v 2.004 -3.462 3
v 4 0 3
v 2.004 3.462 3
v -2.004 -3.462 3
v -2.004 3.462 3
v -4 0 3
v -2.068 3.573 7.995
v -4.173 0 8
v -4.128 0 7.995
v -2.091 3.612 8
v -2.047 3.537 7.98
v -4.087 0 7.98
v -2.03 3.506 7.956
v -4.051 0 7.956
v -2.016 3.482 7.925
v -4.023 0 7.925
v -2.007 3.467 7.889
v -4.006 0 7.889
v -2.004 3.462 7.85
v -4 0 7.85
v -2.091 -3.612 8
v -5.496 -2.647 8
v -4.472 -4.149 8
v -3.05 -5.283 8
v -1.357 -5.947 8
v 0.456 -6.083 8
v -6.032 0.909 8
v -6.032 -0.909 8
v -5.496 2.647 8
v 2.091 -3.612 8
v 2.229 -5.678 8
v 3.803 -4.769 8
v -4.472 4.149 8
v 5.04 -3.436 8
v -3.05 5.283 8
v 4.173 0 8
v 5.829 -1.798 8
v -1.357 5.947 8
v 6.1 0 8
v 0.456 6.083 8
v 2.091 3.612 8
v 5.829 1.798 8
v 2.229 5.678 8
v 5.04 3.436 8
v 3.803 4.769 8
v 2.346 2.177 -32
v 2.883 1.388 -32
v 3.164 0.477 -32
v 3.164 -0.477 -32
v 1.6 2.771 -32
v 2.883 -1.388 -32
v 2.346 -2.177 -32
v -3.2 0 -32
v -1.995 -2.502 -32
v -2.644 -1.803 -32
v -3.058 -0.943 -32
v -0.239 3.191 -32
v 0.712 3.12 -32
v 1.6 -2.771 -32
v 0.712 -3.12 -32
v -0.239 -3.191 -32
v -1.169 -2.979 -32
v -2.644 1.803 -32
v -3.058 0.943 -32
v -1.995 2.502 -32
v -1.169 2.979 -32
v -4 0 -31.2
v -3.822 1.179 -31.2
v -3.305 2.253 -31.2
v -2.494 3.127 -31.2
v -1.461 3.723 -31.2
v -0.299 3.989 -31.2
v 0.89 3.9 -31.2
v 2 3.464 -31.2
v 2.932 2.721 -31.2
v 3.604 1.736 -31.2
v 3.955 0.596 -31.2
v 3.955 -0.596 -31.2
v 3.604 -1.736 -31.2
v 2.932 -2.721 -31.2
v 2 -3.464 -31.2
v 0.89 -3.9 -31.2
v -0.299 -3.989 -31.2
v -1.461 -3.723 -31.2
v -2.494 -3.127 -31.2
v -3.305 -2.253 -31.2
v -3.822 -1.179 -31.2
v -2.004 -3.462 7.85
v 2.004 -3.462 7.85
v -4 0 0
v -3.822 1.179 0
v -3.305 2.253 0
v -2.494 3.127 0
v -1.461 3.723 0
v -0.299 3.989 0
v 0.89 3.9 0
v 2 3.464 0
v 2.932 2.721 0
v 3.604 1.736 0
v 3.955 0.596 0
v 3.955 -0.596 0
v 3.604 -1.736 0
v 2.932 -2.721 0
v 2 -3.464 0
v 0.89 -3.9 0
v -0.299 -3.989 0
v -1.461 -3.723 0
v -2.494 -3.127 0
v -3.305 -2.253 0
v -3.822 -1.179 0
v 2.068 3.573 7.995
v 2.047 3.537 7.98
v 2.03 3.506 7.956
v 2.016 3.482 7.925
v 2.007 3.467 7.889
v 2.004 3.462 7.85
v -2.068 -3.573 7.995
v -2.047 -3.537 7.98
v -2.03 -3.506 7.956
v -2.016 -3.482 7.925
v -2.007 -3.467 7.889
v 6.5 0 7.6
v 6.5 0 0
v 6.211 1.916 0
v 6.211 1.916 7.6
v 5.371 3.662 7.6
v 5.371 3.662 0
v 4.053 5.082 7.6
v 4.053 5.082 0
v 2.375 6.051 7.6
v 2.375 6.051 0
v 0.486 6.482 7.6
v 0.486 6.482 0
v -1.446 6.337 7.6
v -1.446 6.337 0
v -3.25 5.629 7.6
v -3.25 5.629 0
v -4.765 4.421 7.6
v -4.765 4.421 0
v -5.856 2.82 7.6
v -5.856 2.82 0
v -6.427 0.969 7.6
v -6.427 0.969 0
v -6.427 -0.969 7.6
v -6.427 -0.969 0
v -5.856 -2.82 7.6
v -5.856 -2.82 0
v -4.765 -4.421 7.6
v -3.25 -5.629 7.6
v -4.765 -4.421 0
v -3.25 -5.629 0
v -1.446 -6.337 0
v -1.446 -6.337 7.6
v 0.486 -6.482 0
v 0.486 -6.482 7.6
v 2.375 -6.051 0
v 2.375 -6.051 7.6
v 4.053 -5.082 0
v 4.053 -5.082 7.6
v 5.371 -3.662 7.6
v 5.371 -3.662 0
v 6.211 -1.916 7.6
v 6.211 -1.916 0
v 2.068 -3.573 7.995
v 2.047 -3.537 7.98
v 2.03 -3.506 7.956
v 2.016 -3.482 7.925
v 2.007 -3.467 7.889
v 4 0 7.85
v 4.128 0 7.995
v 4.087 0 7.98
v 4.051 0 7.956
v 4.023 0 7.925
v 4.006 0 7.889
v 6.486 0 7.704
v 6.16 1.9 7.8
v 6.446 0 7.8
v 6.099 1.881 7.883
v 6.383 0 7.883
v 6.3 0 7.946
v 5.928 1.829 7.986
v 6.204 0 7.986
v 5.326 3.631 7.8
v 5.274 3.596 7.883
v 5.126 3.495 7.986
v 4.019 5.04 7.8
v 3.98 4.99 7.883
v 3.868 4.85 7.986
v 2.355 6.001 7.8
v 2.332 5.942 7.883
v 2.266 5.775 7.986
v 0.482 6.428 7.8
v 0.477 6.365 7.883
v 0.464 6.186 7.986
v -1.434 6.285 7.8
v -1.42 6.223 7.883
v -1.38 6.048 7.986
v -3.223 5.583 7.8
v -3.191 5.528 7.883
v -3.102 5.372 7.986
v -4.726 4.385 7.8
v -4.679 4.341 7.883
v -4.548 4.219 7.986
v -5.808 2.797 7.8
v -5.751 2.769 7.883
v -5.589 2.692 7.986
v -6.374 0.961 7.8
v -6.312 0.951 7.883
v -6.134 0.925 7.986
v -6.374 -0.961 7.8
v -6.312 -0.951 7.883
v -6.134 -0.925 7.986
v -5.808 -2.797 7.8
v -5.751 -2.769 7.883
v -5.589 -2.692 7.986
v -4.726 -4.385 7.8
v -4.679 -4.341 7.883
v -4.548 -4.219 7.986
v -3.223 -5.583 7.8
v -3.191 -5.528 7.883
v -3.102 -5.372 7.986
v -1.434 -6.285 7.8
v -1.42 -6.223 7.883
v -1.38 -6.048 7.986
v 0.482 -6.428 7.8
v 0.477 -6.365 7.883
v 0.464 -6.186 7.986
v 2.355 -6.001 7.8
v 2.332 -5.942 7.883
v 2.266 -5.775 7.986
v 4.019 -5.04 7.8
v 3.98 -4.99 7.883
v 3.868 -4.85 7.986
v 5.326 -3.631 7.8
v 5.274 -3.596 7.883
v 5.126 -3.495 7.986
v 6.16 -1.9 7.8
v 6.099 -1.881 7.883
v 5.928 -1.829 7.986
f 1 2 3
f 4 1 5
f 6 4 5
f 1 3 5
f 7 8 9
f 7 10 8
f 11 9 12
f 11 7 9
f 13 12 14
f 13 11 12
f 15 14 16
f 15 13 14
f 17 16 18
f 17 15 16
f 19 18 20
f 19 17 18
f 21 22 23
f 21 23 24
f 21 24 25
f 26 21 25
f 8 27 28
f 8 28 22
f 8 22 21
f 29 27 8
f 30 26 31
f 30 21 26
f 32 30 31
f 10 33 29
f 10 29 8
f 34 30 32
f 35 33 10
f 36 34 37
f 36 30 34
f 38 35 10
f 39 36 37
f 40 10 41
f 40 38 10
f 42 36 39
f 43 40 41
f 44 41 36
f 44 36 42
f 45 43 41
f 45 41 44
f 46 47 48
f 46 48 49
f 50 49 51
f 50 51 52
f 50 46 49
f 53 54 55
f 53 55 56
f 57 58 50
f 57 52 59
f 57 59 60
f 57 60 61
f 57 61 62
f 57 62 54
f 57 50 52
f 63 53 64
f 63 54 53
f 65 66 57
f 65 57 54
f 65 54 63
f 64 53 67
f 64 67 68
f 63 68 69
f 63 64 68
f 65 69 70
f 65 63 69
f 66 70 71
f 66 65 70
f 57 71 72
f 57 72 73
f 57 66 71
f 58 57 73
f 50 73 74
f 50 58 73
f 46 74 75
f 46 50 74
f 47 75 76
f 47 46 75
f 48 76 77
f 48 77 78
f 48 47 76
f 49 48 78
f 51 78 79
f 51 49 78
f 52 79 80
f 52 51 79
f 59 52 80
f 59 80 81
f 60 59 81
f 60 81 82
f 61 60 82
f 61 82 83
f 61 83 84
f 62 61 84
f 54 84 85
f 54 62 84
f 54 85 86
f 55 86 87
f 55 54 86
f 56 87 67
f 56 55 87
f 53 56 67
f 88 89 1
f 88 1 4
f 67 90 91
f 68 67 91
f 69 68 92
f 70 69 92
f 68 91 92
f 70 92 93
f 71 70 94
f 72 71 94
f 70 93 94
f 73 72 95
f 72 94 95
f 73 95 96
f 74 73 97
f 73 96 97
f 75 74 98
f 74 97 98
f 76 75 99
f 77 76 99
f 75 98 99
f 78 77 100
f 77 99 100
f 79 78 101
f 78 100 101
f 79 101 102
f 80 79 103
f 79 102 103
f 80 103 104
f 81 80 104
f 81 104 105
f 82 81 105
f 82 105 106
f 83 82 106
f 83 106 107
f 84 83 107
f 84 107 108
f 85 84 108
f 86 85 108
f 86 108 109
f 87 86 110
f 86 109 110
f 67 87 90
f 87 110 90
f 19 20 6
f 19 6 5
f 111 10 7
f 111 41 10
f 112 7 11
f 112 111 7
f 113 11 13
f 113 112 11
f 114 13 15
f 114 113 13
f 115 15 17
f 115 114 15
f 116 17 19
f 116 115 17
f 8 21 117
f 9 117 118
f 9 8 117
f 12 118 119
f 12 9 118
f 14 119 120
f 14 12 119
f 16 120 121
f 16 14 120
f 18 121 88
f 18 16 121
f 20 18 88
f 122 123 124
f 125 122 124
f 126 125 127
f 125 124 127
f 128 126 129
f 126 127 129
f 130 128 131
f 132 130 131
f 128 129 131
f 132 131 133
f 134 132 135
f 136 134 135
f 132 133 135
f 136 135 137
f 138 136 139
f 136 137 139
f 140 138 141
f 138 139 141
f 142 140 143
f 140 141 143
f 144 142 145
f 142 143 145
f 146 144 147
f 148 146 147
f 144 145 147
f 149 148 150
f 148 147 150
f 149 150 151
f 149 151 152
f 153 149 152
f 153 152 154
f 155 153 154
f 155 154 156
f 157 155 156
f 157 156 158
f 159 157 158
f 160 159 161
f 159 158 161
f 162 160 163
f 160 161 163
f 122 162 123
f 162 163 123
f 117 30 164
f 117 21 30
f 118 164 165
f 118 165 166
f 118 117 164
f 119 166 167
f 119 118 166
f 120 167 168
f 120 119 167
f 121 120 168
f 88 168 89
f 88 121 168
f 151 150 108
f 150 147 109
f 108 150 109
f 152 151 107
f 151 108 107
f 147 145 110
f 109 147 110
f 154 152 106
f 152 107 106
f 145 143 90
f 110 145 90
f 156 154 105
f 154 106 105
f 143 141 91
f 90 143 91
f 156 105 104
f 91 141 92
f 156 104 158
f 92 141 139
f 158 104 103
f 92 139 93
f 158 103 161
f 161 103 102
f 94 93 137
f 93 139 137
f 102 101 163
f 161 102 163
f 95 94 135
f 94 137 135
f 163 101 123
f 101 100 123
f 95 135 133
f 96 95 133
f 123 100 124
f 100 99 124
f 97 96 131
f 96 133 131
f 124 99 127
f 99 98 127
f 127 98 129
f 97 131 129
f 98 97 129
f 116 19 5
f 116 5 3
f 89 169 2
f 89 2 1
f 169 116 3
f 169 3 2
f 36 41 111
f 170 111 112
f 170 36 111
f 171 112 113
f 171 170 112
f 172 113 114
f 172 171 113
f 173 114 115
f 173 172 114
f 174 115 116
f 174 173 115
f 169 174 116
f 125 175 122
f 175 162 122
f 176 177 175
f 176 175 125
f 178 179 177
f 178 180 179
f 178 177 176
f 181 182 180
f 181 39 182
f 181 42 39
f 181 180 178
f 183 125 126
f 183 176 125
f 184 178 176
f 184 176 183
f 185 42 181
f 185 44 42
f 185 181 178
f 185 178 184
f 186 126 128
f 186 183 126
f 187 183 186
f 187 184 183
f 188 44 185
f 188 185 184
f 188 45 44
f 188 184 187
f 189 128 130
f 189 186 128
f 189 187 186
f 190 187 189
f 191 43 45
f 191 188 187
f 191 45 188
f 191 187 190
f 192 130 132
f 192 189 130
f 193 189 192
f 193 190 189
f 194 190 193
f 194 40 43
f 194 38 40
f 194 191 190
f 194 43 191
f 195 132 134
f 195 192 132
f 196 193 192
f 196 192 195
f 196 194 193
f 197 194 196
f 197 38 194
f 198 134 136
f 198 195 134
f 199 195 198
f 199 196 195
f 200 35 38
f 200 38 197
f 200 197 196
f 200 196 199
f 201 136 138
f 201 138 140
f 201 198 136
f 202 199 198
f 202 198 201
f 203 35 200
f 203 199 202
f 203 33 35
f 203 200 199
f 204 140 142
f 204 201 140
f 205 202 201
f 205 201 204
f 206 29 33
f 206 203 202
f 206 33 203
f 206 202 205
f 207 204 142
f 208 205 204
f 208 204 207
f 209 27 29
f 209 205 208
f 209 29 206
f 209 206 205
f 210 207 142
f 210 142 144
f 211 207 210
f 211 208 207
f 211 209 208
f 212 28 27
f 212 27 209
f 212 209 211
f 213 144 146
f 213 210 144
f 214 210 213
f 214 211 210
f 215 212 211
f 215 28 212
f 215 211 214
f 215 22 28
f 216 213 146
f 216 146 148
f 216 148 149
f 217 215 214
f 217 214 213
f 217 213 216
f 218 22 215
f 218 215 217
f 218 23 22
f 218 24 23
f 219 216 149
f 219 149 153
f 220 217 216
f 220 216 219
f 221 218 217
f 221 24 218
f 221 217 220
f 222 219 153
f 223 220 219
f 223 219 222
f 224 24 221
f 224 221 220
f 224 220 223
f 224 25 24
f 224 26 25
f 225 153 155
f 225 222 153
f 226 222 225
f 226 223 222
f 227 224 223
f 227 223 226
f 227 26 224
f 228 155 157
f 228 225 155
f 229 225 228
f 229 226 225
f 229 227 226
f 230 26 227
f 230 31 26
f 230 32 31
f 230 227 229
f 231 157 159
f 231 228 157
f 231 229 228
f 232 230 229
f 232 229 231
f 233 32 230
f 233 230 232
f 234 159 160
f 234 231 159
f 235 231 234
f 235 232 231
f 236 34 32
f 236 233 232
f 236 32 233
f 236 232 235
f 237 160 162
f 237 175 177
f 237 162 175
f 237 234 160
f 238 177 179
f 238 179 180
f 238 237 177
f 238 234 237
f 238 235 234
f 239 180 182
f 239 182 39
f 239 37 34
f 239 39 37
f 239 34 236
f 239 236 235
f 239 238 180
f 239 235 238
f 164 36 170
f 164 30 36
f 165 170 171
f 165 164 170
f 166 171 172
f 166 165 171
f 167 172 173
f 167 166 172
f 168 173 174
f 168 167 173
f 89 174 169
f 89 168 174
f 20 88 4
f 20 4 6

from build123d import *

# Parameters (mm, degrees)
ESQUISSE1_R             = 6.5
BASE_EXTRUSION_DEPTH    = 8
ENL_V_MAT_EXTRU_1_DEPTH = 5
CONG_1_R                = 0.4
CONG_2_R                = 0.15
ESQUISSE3_R             = 4
BOSS_EXTRU_1_DEPTH      = 32
CHANFREIN1_SIZE         = 0.8


with BuildPart() as part:
    # Esquisse1 → Base-Extrusion (new body)
    with BuildSketch(Plane.XY):
        Circle(ESQUISSE1_R)
    extrude(amount=BASE_EXTRUSION_DEPTH)

    # Esquisse2 → Enlèv. mat.-Extru.1 (cut)
    with BuildSketch(Plane.XY.offset(8)):
        Polygon((-4, 0), (-2.004145082, 3.461705142), (2.004145082, 3.461705142), (4, 0), (2.004145082, -3.461705142), (-2.004145082, -3.461705142), align=None)
    extrude(amount=-ENL_V_MAT_EXTRU_1_DEPTH, mode=Mode.SUBTRACT)

    # Congé1
    cong_1_edges = [part.edges().sort_by_distance(p)[0] for p in [
        (-6.5, 0, 8),
    ]]
    fillet(cong_1_edges, radius=CONG_1_R)

    # Congé2
    cong_2_edges = [part.edges().sort_by_distance(p)[0] for p in [
        (-3.002072541, -1.730852571, 8),
        (0, -3.461705142, 8),
        (3.002072541, -1.730852571, 8),
        (3.002072541, 1.730852571, 8),
        (0, 3.461705142, 8),
        (-3.002072541, 1.730852571, 8),
    ]]
    fillet(cong_2_edges, radius=CONG_2_R)

    # Esquisse3 → Boss.-Extru.1 (add)
    with BuildSketch(Plane(origin=(0, 0, 0), x_dir=(-1, 0, 0), z_dir=(0, 0, -1))):
        Circle(ESQUISSE3_R)
    extrude(amount=BOSS_EXTRU_1_DEPTH)

    # Chanfrein1
    chanfrein1_edges = [part.edges().sort_by_distance(p)[0] for p in [
        (4, 0, -32),
    ]]
    chamfer(chanfrein1_edges, length=CHANFREIN1_SIZE)


solid = part.part
